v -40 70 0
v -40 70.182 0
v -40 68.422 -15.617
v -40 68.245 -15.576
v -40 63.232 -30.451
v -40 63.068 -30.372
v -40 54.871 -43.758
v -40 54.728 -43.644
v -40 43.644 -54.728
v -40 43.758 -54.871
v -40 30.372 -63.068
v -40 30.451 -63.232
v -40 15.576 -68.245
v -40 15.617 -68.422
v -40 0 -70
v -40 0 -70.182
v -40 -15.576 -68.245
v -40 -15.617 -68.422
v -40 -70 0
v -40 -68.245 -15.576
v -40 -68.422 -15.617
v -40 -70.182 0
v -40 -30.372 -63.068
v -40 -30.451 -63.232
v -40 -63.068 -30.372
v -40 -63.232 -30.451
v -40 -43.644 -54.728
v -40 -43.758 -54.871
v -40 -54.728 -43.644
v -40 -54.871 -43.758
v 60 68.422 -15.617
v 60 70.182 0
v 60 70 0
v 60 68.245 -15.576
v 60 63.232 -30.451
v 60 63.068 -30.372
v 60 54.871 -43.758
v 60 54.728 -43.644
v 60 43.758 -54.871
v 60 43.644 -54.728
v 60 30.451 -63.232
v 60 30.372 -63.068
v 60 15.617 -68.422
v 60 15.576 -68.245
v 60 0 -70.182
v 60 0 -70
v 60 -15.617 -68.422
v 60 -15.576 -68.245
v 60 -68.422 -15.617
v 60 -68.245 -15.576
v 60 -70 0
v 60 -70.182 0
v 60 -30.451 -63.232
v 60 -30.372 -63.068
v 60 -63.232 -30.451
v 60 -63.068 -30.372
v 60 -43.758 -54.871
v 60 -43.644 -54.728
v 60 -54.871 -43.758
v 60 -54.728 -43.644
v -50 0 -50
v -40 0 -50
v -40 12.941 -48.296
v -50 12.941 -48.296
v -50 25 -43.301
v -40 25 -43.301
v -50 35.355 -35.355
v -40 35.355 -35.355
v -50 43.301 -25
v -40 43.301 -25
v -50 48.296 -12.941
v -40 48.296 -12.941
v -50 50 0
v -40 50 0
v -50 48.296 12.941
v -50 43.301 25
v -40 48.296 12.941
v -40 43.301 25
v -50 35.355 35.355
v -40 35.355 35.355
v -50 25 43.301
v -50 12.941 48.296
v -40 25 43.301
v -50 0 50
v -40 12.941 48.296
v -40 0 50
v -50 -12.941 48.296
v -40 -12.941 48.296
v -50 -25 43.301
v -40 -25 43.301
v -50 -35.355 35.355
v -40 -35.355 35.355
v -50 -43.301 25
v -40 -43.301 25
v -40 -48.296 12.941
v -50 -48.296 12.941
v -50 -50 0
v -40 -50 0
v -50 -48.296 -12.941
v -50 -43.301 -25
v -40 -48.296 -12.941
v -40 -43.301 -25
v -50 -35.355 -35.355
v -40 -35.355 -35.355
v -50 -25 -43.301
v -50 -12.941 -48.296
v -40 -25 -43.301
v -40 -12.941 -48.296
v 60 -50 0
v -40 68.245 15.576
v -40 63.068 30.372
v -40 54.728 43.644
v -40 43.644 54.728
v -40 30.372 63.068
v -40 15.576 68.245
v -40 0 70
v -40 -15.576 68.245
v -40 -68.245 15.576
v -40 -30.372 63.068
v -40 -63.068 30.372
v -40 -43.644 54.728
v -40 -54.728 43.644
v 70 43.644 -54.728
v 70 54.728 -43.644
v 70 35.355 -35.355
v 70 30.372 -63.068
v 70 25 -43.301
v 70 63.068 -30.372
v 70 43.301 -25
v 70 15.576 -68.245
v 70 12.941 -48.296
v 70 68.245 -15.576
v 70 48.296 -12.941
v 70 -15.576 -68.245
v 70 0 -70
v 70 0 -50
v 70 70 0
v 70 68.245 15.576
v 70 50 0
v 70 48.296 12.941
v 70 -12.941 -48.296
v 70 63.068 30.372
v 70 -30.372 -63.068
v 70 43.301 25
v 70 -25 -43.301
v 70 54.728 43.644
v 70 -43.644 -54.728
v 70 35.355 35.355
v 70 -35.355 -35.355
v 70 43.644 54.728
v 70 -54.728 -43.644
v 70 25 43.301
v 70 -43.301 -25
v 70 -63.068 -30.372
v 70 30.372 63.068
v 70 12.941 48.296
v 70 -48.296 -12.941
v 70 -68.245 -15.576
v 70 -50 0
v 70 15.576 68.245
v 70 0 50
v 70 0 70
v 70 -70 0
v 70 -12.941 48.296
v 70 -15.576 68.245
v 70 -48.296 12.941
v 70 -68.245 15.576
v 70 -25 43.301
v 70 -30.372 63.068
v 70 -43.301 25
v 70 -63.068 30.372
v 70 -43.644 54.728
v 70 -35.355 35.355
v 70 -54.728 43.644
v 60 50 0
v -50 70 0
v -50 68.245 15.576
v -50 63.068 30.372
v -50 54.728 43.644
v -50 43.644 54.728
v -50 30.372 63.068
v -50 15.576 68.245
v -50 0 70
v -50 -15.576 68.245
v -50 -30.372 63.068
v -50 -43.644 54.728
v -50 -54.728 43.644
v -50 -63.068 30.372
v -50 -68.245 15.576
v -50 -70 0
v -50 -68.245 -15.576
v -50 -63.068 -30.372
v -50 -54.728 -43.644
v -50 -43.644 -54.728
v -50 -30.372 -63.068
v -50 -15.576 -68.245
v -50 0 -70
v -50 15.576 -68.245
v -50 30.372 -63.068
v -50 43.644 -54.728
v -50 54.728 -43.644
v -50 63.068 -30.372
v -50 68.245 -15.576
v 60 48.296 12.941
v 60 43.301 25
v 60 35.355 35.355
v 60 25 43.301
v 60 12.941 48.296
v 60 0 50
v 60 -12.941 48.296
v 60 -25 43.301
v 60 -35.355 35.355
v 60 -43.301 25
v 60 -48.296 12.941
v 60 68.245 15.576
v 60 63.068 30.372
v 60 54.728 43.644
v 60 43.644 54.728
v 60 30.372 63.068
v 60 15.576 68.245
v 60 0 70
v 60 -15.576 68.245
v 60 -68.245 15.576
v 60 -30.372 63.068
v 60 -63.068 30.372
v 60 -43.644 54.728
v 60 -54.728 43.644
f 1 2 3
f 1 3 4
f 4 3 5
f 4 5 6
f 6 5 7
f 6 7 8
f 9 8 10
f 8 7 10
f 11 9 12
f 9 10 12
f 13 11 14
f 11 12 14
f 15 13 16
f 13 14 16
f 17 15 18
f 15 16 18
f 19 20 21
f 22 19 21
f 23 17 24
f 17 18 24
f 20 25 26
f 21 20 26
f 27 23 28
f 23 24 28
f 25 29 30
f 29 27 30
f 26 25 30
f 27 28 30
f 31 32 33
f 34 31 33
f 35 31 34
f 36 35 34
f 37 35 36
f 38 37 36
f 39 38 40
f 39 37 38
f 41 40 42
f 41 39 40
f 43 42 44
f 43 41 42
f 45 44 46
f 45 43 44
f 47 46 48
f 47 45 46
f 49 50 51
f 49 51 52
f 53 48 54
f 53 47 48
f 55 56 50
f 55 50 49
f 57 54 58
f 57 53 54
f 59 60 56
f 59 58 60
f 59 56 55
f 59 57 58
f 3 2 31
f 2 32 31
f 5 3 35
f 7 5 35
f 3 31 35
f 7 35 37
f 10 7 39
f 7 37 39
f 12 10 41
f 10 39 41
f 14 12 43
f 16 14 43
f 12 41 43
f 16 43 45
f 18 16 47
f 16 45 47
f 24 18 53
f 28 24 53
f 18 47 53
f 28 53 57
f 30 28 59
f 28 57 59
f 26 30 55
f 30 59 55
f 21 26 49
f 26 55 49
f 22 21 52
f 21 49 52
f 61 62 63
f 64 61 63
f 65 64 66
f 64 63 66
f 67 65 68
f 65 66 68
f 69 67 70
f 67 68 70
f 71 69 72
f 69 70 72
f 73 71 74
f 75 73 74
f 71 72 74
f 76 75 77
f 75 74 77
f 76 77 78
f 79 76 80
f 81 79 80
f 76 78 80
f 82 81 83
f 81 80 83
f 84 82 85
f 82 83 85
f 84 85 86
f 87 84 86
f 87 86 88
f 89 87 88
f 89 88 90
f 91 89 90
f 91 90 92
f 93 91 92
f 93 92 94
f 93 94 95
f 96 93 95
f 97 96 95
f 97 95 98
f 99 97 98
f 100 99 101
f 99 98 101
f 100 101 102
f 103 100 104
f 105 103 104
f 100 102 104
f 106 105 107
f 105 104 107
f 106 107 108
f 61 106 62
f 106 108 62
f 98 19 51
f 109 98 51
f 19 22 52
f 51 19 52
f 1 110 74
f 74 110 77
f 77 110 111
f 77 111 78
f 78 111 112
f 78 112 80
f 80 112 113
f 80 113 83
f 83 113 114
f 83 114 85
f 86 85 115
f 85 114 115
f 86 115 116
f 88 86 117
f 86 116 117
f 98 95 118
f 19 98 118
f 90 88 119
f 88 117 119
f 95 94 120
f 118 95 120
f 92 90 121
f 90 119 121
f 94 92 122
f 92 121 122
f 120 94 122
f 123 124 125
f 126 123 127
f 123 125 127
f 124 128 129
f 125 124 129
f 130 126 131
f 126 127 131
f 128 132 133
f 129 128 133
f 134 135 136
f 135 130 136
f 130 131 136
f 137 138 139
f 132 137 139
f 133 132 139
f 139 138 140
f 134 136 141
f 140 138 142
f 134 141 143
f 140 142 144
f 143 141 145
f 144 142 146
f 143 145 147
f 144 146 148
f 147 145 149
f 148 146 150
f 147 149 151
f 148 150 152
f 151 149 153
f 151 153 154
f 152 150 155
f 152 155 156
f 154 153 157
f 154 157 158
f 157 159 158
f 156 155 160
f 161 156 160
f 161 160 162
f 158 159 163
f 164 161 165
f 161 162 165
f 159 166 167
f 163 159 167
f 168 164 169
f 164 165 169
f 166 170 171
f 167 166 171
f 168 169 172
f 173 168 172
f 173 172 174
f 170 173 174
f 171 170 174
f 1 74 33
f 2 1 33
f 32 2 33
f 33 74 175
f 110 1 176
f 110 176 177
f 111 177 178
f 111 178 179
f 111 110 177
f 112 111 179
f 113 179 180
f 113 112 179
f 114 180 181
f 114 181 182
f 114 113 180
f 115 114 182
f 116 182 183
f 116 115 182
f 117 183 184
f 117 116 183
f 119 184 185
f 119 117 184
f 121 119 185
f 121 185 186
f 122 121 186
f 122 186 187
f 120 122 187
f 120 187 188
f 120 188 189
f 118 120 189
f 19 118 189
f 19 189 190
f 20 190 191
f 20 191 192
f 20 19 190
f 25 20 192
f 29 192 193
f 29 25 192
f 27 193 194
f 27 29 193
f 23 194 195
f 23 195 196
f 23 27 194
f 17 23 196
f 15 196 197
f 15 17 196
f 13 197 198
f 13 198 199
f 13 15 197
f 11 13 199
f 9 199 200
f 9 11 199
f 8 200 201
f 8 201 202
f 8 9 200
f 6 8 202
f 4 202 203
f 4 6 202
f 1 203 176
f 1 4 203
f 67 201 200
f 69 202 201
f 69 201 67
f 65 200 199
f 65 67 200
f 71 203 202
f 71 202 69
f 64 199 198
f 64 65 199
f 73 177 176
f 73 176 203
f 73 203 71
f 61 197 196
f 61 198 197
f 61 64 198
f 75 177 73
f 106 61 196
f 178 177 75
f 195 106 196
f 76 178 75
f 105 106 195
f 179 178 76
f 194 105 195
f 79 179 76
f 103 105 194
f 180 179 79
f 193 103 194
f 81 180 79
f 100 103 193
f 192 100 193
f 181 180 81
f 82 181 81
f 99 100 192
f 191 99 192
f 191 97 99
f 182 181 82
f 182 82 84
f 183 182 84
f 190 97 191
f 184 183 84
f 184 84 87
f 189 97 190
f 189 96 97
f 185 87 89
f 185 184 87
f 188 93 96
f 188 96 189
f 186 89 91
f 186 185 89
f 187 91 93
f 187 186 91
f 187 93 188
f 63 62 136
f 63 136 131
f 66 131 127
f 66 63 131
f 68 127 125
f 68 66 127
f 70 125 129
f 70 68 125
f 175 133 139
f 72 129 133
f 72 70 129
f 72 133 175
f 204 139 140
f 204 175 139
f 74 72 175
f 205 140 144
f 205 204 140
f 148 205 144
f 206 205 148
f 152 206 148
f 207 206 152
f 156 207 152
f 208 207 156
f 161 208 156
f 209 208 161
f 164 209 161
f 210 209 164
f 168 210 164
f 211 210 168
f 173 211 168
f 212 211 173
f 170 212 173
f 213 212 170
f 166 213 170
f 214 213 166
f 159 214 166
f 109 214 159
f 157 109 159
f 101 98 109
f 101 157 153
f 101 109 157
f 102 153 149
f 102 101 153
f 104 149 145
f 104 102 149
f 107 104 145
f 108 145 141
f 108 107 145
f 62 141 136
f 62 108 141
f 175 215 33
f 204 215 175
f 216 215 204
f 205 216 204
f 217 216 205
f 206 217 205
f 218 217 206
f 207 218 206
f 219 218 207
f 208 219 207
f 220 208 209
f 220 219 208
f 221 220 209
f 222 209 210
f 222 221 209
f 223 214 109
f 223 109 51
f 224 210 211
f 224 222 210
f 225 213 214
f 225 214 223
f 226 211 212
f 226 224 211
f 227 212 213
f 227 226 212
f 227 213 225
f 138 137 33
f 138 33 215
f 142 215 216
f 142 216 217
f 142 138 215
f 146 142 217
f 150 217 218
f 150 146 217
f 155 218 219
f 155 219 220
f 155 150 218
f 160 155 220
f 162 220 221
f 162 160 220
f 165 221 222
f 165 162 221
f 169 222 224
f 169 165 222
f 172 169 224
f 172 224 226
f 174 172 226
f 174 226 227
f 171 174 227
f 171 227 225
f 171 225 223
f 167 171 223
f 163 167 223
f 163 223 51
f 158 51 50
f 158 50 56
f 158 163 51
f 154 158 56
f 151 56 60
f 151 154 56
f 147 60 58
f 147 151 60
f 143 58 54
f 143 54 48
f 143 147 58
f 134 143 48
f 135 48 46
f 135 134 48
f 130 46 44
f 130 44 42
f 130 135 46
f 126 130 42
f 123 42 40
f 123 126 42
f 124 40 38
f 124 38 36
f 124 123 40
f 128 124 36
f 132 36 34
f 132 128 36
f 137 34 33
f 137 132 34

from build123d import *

# Parameters (mm, degrees)
ESQUISSE1_W                  = 10
ESQUISSE1_H                  = 70
ESQUISSE1_4_W                = 10
ESQUISSE1_4_H                = 70
ESQUISSE14_W                 = 100
ESQUISSE14_H                 = 70.182088946
R_VOLUTION5_ANGLE            = 180
ESQUISSE15_R                 = 50
ENL_V_MAT_EXTRU_1_DEPTH      = 111
ENL_V_MAT_EXTRU_1_DEPTH_BACK = 11


with BuildPart() as part:
    # Esquisse1 → R_vol.-Mince2 (revolve)
    with BuildSketch(Plane.XY):
        with Locations((-45, 35)):
            Rectangle(ESQUISSE1_W, ESQUISSE1_H)
    revolve(axis=Axis((-50, 0, 0), (1, 0, 0)))



with BuildPart() as body_2:
    # Esquisse1_4 → R_vol.-Mince3 (revolve)
    with BuildSketch(Plane.XY):
        with Locations((65, 35)):
            Rectangle(ESQUISSE1_4_W, ESQUISSE1_4_H)
    revolve(axis=Axis((-50, 0, 0), (1, 0, 0)))


with BuildPart() as part_1:
    add(part.part)

    add(body_2.part)  # R_volution5 merges body 2
    # Esquisse14 → R_volution5 (revolve)
    with BuildSketch(Plane.XY):
        with Locations((10, 35.091044473)):
            Rectangle(ESQUISSE14_W, ESQUISSE14_H)
    revolve(axis=Axis((60, 0, 0), (-1, 0, 0)), revolution_arc=R_VOLUTION5_ANGLE)

    # Esquisse15 → Enl_v. mat.-Extru.1 (cut, two sides)
    with BuildSketch(Plane(origin=(-40, 0, 0), x_dir=(0, 0, -1), z_dir=(1, 0, 0))) as enl_v_mat_extru_1_sk:
        Circle(ESQUISSE15_R)
    extrude(amount=ENL_V_MAT_EXTRU_1_DEPTH, mode=Mode.SUBTRACT)
    extrude(enl_v_mat_extru_1_sk.sketch, amount=-ENL_V_MAT_EXTRU_1_DEPTH_BACK, mode=Mode.SUBTRACT)


solid = part_1.part
